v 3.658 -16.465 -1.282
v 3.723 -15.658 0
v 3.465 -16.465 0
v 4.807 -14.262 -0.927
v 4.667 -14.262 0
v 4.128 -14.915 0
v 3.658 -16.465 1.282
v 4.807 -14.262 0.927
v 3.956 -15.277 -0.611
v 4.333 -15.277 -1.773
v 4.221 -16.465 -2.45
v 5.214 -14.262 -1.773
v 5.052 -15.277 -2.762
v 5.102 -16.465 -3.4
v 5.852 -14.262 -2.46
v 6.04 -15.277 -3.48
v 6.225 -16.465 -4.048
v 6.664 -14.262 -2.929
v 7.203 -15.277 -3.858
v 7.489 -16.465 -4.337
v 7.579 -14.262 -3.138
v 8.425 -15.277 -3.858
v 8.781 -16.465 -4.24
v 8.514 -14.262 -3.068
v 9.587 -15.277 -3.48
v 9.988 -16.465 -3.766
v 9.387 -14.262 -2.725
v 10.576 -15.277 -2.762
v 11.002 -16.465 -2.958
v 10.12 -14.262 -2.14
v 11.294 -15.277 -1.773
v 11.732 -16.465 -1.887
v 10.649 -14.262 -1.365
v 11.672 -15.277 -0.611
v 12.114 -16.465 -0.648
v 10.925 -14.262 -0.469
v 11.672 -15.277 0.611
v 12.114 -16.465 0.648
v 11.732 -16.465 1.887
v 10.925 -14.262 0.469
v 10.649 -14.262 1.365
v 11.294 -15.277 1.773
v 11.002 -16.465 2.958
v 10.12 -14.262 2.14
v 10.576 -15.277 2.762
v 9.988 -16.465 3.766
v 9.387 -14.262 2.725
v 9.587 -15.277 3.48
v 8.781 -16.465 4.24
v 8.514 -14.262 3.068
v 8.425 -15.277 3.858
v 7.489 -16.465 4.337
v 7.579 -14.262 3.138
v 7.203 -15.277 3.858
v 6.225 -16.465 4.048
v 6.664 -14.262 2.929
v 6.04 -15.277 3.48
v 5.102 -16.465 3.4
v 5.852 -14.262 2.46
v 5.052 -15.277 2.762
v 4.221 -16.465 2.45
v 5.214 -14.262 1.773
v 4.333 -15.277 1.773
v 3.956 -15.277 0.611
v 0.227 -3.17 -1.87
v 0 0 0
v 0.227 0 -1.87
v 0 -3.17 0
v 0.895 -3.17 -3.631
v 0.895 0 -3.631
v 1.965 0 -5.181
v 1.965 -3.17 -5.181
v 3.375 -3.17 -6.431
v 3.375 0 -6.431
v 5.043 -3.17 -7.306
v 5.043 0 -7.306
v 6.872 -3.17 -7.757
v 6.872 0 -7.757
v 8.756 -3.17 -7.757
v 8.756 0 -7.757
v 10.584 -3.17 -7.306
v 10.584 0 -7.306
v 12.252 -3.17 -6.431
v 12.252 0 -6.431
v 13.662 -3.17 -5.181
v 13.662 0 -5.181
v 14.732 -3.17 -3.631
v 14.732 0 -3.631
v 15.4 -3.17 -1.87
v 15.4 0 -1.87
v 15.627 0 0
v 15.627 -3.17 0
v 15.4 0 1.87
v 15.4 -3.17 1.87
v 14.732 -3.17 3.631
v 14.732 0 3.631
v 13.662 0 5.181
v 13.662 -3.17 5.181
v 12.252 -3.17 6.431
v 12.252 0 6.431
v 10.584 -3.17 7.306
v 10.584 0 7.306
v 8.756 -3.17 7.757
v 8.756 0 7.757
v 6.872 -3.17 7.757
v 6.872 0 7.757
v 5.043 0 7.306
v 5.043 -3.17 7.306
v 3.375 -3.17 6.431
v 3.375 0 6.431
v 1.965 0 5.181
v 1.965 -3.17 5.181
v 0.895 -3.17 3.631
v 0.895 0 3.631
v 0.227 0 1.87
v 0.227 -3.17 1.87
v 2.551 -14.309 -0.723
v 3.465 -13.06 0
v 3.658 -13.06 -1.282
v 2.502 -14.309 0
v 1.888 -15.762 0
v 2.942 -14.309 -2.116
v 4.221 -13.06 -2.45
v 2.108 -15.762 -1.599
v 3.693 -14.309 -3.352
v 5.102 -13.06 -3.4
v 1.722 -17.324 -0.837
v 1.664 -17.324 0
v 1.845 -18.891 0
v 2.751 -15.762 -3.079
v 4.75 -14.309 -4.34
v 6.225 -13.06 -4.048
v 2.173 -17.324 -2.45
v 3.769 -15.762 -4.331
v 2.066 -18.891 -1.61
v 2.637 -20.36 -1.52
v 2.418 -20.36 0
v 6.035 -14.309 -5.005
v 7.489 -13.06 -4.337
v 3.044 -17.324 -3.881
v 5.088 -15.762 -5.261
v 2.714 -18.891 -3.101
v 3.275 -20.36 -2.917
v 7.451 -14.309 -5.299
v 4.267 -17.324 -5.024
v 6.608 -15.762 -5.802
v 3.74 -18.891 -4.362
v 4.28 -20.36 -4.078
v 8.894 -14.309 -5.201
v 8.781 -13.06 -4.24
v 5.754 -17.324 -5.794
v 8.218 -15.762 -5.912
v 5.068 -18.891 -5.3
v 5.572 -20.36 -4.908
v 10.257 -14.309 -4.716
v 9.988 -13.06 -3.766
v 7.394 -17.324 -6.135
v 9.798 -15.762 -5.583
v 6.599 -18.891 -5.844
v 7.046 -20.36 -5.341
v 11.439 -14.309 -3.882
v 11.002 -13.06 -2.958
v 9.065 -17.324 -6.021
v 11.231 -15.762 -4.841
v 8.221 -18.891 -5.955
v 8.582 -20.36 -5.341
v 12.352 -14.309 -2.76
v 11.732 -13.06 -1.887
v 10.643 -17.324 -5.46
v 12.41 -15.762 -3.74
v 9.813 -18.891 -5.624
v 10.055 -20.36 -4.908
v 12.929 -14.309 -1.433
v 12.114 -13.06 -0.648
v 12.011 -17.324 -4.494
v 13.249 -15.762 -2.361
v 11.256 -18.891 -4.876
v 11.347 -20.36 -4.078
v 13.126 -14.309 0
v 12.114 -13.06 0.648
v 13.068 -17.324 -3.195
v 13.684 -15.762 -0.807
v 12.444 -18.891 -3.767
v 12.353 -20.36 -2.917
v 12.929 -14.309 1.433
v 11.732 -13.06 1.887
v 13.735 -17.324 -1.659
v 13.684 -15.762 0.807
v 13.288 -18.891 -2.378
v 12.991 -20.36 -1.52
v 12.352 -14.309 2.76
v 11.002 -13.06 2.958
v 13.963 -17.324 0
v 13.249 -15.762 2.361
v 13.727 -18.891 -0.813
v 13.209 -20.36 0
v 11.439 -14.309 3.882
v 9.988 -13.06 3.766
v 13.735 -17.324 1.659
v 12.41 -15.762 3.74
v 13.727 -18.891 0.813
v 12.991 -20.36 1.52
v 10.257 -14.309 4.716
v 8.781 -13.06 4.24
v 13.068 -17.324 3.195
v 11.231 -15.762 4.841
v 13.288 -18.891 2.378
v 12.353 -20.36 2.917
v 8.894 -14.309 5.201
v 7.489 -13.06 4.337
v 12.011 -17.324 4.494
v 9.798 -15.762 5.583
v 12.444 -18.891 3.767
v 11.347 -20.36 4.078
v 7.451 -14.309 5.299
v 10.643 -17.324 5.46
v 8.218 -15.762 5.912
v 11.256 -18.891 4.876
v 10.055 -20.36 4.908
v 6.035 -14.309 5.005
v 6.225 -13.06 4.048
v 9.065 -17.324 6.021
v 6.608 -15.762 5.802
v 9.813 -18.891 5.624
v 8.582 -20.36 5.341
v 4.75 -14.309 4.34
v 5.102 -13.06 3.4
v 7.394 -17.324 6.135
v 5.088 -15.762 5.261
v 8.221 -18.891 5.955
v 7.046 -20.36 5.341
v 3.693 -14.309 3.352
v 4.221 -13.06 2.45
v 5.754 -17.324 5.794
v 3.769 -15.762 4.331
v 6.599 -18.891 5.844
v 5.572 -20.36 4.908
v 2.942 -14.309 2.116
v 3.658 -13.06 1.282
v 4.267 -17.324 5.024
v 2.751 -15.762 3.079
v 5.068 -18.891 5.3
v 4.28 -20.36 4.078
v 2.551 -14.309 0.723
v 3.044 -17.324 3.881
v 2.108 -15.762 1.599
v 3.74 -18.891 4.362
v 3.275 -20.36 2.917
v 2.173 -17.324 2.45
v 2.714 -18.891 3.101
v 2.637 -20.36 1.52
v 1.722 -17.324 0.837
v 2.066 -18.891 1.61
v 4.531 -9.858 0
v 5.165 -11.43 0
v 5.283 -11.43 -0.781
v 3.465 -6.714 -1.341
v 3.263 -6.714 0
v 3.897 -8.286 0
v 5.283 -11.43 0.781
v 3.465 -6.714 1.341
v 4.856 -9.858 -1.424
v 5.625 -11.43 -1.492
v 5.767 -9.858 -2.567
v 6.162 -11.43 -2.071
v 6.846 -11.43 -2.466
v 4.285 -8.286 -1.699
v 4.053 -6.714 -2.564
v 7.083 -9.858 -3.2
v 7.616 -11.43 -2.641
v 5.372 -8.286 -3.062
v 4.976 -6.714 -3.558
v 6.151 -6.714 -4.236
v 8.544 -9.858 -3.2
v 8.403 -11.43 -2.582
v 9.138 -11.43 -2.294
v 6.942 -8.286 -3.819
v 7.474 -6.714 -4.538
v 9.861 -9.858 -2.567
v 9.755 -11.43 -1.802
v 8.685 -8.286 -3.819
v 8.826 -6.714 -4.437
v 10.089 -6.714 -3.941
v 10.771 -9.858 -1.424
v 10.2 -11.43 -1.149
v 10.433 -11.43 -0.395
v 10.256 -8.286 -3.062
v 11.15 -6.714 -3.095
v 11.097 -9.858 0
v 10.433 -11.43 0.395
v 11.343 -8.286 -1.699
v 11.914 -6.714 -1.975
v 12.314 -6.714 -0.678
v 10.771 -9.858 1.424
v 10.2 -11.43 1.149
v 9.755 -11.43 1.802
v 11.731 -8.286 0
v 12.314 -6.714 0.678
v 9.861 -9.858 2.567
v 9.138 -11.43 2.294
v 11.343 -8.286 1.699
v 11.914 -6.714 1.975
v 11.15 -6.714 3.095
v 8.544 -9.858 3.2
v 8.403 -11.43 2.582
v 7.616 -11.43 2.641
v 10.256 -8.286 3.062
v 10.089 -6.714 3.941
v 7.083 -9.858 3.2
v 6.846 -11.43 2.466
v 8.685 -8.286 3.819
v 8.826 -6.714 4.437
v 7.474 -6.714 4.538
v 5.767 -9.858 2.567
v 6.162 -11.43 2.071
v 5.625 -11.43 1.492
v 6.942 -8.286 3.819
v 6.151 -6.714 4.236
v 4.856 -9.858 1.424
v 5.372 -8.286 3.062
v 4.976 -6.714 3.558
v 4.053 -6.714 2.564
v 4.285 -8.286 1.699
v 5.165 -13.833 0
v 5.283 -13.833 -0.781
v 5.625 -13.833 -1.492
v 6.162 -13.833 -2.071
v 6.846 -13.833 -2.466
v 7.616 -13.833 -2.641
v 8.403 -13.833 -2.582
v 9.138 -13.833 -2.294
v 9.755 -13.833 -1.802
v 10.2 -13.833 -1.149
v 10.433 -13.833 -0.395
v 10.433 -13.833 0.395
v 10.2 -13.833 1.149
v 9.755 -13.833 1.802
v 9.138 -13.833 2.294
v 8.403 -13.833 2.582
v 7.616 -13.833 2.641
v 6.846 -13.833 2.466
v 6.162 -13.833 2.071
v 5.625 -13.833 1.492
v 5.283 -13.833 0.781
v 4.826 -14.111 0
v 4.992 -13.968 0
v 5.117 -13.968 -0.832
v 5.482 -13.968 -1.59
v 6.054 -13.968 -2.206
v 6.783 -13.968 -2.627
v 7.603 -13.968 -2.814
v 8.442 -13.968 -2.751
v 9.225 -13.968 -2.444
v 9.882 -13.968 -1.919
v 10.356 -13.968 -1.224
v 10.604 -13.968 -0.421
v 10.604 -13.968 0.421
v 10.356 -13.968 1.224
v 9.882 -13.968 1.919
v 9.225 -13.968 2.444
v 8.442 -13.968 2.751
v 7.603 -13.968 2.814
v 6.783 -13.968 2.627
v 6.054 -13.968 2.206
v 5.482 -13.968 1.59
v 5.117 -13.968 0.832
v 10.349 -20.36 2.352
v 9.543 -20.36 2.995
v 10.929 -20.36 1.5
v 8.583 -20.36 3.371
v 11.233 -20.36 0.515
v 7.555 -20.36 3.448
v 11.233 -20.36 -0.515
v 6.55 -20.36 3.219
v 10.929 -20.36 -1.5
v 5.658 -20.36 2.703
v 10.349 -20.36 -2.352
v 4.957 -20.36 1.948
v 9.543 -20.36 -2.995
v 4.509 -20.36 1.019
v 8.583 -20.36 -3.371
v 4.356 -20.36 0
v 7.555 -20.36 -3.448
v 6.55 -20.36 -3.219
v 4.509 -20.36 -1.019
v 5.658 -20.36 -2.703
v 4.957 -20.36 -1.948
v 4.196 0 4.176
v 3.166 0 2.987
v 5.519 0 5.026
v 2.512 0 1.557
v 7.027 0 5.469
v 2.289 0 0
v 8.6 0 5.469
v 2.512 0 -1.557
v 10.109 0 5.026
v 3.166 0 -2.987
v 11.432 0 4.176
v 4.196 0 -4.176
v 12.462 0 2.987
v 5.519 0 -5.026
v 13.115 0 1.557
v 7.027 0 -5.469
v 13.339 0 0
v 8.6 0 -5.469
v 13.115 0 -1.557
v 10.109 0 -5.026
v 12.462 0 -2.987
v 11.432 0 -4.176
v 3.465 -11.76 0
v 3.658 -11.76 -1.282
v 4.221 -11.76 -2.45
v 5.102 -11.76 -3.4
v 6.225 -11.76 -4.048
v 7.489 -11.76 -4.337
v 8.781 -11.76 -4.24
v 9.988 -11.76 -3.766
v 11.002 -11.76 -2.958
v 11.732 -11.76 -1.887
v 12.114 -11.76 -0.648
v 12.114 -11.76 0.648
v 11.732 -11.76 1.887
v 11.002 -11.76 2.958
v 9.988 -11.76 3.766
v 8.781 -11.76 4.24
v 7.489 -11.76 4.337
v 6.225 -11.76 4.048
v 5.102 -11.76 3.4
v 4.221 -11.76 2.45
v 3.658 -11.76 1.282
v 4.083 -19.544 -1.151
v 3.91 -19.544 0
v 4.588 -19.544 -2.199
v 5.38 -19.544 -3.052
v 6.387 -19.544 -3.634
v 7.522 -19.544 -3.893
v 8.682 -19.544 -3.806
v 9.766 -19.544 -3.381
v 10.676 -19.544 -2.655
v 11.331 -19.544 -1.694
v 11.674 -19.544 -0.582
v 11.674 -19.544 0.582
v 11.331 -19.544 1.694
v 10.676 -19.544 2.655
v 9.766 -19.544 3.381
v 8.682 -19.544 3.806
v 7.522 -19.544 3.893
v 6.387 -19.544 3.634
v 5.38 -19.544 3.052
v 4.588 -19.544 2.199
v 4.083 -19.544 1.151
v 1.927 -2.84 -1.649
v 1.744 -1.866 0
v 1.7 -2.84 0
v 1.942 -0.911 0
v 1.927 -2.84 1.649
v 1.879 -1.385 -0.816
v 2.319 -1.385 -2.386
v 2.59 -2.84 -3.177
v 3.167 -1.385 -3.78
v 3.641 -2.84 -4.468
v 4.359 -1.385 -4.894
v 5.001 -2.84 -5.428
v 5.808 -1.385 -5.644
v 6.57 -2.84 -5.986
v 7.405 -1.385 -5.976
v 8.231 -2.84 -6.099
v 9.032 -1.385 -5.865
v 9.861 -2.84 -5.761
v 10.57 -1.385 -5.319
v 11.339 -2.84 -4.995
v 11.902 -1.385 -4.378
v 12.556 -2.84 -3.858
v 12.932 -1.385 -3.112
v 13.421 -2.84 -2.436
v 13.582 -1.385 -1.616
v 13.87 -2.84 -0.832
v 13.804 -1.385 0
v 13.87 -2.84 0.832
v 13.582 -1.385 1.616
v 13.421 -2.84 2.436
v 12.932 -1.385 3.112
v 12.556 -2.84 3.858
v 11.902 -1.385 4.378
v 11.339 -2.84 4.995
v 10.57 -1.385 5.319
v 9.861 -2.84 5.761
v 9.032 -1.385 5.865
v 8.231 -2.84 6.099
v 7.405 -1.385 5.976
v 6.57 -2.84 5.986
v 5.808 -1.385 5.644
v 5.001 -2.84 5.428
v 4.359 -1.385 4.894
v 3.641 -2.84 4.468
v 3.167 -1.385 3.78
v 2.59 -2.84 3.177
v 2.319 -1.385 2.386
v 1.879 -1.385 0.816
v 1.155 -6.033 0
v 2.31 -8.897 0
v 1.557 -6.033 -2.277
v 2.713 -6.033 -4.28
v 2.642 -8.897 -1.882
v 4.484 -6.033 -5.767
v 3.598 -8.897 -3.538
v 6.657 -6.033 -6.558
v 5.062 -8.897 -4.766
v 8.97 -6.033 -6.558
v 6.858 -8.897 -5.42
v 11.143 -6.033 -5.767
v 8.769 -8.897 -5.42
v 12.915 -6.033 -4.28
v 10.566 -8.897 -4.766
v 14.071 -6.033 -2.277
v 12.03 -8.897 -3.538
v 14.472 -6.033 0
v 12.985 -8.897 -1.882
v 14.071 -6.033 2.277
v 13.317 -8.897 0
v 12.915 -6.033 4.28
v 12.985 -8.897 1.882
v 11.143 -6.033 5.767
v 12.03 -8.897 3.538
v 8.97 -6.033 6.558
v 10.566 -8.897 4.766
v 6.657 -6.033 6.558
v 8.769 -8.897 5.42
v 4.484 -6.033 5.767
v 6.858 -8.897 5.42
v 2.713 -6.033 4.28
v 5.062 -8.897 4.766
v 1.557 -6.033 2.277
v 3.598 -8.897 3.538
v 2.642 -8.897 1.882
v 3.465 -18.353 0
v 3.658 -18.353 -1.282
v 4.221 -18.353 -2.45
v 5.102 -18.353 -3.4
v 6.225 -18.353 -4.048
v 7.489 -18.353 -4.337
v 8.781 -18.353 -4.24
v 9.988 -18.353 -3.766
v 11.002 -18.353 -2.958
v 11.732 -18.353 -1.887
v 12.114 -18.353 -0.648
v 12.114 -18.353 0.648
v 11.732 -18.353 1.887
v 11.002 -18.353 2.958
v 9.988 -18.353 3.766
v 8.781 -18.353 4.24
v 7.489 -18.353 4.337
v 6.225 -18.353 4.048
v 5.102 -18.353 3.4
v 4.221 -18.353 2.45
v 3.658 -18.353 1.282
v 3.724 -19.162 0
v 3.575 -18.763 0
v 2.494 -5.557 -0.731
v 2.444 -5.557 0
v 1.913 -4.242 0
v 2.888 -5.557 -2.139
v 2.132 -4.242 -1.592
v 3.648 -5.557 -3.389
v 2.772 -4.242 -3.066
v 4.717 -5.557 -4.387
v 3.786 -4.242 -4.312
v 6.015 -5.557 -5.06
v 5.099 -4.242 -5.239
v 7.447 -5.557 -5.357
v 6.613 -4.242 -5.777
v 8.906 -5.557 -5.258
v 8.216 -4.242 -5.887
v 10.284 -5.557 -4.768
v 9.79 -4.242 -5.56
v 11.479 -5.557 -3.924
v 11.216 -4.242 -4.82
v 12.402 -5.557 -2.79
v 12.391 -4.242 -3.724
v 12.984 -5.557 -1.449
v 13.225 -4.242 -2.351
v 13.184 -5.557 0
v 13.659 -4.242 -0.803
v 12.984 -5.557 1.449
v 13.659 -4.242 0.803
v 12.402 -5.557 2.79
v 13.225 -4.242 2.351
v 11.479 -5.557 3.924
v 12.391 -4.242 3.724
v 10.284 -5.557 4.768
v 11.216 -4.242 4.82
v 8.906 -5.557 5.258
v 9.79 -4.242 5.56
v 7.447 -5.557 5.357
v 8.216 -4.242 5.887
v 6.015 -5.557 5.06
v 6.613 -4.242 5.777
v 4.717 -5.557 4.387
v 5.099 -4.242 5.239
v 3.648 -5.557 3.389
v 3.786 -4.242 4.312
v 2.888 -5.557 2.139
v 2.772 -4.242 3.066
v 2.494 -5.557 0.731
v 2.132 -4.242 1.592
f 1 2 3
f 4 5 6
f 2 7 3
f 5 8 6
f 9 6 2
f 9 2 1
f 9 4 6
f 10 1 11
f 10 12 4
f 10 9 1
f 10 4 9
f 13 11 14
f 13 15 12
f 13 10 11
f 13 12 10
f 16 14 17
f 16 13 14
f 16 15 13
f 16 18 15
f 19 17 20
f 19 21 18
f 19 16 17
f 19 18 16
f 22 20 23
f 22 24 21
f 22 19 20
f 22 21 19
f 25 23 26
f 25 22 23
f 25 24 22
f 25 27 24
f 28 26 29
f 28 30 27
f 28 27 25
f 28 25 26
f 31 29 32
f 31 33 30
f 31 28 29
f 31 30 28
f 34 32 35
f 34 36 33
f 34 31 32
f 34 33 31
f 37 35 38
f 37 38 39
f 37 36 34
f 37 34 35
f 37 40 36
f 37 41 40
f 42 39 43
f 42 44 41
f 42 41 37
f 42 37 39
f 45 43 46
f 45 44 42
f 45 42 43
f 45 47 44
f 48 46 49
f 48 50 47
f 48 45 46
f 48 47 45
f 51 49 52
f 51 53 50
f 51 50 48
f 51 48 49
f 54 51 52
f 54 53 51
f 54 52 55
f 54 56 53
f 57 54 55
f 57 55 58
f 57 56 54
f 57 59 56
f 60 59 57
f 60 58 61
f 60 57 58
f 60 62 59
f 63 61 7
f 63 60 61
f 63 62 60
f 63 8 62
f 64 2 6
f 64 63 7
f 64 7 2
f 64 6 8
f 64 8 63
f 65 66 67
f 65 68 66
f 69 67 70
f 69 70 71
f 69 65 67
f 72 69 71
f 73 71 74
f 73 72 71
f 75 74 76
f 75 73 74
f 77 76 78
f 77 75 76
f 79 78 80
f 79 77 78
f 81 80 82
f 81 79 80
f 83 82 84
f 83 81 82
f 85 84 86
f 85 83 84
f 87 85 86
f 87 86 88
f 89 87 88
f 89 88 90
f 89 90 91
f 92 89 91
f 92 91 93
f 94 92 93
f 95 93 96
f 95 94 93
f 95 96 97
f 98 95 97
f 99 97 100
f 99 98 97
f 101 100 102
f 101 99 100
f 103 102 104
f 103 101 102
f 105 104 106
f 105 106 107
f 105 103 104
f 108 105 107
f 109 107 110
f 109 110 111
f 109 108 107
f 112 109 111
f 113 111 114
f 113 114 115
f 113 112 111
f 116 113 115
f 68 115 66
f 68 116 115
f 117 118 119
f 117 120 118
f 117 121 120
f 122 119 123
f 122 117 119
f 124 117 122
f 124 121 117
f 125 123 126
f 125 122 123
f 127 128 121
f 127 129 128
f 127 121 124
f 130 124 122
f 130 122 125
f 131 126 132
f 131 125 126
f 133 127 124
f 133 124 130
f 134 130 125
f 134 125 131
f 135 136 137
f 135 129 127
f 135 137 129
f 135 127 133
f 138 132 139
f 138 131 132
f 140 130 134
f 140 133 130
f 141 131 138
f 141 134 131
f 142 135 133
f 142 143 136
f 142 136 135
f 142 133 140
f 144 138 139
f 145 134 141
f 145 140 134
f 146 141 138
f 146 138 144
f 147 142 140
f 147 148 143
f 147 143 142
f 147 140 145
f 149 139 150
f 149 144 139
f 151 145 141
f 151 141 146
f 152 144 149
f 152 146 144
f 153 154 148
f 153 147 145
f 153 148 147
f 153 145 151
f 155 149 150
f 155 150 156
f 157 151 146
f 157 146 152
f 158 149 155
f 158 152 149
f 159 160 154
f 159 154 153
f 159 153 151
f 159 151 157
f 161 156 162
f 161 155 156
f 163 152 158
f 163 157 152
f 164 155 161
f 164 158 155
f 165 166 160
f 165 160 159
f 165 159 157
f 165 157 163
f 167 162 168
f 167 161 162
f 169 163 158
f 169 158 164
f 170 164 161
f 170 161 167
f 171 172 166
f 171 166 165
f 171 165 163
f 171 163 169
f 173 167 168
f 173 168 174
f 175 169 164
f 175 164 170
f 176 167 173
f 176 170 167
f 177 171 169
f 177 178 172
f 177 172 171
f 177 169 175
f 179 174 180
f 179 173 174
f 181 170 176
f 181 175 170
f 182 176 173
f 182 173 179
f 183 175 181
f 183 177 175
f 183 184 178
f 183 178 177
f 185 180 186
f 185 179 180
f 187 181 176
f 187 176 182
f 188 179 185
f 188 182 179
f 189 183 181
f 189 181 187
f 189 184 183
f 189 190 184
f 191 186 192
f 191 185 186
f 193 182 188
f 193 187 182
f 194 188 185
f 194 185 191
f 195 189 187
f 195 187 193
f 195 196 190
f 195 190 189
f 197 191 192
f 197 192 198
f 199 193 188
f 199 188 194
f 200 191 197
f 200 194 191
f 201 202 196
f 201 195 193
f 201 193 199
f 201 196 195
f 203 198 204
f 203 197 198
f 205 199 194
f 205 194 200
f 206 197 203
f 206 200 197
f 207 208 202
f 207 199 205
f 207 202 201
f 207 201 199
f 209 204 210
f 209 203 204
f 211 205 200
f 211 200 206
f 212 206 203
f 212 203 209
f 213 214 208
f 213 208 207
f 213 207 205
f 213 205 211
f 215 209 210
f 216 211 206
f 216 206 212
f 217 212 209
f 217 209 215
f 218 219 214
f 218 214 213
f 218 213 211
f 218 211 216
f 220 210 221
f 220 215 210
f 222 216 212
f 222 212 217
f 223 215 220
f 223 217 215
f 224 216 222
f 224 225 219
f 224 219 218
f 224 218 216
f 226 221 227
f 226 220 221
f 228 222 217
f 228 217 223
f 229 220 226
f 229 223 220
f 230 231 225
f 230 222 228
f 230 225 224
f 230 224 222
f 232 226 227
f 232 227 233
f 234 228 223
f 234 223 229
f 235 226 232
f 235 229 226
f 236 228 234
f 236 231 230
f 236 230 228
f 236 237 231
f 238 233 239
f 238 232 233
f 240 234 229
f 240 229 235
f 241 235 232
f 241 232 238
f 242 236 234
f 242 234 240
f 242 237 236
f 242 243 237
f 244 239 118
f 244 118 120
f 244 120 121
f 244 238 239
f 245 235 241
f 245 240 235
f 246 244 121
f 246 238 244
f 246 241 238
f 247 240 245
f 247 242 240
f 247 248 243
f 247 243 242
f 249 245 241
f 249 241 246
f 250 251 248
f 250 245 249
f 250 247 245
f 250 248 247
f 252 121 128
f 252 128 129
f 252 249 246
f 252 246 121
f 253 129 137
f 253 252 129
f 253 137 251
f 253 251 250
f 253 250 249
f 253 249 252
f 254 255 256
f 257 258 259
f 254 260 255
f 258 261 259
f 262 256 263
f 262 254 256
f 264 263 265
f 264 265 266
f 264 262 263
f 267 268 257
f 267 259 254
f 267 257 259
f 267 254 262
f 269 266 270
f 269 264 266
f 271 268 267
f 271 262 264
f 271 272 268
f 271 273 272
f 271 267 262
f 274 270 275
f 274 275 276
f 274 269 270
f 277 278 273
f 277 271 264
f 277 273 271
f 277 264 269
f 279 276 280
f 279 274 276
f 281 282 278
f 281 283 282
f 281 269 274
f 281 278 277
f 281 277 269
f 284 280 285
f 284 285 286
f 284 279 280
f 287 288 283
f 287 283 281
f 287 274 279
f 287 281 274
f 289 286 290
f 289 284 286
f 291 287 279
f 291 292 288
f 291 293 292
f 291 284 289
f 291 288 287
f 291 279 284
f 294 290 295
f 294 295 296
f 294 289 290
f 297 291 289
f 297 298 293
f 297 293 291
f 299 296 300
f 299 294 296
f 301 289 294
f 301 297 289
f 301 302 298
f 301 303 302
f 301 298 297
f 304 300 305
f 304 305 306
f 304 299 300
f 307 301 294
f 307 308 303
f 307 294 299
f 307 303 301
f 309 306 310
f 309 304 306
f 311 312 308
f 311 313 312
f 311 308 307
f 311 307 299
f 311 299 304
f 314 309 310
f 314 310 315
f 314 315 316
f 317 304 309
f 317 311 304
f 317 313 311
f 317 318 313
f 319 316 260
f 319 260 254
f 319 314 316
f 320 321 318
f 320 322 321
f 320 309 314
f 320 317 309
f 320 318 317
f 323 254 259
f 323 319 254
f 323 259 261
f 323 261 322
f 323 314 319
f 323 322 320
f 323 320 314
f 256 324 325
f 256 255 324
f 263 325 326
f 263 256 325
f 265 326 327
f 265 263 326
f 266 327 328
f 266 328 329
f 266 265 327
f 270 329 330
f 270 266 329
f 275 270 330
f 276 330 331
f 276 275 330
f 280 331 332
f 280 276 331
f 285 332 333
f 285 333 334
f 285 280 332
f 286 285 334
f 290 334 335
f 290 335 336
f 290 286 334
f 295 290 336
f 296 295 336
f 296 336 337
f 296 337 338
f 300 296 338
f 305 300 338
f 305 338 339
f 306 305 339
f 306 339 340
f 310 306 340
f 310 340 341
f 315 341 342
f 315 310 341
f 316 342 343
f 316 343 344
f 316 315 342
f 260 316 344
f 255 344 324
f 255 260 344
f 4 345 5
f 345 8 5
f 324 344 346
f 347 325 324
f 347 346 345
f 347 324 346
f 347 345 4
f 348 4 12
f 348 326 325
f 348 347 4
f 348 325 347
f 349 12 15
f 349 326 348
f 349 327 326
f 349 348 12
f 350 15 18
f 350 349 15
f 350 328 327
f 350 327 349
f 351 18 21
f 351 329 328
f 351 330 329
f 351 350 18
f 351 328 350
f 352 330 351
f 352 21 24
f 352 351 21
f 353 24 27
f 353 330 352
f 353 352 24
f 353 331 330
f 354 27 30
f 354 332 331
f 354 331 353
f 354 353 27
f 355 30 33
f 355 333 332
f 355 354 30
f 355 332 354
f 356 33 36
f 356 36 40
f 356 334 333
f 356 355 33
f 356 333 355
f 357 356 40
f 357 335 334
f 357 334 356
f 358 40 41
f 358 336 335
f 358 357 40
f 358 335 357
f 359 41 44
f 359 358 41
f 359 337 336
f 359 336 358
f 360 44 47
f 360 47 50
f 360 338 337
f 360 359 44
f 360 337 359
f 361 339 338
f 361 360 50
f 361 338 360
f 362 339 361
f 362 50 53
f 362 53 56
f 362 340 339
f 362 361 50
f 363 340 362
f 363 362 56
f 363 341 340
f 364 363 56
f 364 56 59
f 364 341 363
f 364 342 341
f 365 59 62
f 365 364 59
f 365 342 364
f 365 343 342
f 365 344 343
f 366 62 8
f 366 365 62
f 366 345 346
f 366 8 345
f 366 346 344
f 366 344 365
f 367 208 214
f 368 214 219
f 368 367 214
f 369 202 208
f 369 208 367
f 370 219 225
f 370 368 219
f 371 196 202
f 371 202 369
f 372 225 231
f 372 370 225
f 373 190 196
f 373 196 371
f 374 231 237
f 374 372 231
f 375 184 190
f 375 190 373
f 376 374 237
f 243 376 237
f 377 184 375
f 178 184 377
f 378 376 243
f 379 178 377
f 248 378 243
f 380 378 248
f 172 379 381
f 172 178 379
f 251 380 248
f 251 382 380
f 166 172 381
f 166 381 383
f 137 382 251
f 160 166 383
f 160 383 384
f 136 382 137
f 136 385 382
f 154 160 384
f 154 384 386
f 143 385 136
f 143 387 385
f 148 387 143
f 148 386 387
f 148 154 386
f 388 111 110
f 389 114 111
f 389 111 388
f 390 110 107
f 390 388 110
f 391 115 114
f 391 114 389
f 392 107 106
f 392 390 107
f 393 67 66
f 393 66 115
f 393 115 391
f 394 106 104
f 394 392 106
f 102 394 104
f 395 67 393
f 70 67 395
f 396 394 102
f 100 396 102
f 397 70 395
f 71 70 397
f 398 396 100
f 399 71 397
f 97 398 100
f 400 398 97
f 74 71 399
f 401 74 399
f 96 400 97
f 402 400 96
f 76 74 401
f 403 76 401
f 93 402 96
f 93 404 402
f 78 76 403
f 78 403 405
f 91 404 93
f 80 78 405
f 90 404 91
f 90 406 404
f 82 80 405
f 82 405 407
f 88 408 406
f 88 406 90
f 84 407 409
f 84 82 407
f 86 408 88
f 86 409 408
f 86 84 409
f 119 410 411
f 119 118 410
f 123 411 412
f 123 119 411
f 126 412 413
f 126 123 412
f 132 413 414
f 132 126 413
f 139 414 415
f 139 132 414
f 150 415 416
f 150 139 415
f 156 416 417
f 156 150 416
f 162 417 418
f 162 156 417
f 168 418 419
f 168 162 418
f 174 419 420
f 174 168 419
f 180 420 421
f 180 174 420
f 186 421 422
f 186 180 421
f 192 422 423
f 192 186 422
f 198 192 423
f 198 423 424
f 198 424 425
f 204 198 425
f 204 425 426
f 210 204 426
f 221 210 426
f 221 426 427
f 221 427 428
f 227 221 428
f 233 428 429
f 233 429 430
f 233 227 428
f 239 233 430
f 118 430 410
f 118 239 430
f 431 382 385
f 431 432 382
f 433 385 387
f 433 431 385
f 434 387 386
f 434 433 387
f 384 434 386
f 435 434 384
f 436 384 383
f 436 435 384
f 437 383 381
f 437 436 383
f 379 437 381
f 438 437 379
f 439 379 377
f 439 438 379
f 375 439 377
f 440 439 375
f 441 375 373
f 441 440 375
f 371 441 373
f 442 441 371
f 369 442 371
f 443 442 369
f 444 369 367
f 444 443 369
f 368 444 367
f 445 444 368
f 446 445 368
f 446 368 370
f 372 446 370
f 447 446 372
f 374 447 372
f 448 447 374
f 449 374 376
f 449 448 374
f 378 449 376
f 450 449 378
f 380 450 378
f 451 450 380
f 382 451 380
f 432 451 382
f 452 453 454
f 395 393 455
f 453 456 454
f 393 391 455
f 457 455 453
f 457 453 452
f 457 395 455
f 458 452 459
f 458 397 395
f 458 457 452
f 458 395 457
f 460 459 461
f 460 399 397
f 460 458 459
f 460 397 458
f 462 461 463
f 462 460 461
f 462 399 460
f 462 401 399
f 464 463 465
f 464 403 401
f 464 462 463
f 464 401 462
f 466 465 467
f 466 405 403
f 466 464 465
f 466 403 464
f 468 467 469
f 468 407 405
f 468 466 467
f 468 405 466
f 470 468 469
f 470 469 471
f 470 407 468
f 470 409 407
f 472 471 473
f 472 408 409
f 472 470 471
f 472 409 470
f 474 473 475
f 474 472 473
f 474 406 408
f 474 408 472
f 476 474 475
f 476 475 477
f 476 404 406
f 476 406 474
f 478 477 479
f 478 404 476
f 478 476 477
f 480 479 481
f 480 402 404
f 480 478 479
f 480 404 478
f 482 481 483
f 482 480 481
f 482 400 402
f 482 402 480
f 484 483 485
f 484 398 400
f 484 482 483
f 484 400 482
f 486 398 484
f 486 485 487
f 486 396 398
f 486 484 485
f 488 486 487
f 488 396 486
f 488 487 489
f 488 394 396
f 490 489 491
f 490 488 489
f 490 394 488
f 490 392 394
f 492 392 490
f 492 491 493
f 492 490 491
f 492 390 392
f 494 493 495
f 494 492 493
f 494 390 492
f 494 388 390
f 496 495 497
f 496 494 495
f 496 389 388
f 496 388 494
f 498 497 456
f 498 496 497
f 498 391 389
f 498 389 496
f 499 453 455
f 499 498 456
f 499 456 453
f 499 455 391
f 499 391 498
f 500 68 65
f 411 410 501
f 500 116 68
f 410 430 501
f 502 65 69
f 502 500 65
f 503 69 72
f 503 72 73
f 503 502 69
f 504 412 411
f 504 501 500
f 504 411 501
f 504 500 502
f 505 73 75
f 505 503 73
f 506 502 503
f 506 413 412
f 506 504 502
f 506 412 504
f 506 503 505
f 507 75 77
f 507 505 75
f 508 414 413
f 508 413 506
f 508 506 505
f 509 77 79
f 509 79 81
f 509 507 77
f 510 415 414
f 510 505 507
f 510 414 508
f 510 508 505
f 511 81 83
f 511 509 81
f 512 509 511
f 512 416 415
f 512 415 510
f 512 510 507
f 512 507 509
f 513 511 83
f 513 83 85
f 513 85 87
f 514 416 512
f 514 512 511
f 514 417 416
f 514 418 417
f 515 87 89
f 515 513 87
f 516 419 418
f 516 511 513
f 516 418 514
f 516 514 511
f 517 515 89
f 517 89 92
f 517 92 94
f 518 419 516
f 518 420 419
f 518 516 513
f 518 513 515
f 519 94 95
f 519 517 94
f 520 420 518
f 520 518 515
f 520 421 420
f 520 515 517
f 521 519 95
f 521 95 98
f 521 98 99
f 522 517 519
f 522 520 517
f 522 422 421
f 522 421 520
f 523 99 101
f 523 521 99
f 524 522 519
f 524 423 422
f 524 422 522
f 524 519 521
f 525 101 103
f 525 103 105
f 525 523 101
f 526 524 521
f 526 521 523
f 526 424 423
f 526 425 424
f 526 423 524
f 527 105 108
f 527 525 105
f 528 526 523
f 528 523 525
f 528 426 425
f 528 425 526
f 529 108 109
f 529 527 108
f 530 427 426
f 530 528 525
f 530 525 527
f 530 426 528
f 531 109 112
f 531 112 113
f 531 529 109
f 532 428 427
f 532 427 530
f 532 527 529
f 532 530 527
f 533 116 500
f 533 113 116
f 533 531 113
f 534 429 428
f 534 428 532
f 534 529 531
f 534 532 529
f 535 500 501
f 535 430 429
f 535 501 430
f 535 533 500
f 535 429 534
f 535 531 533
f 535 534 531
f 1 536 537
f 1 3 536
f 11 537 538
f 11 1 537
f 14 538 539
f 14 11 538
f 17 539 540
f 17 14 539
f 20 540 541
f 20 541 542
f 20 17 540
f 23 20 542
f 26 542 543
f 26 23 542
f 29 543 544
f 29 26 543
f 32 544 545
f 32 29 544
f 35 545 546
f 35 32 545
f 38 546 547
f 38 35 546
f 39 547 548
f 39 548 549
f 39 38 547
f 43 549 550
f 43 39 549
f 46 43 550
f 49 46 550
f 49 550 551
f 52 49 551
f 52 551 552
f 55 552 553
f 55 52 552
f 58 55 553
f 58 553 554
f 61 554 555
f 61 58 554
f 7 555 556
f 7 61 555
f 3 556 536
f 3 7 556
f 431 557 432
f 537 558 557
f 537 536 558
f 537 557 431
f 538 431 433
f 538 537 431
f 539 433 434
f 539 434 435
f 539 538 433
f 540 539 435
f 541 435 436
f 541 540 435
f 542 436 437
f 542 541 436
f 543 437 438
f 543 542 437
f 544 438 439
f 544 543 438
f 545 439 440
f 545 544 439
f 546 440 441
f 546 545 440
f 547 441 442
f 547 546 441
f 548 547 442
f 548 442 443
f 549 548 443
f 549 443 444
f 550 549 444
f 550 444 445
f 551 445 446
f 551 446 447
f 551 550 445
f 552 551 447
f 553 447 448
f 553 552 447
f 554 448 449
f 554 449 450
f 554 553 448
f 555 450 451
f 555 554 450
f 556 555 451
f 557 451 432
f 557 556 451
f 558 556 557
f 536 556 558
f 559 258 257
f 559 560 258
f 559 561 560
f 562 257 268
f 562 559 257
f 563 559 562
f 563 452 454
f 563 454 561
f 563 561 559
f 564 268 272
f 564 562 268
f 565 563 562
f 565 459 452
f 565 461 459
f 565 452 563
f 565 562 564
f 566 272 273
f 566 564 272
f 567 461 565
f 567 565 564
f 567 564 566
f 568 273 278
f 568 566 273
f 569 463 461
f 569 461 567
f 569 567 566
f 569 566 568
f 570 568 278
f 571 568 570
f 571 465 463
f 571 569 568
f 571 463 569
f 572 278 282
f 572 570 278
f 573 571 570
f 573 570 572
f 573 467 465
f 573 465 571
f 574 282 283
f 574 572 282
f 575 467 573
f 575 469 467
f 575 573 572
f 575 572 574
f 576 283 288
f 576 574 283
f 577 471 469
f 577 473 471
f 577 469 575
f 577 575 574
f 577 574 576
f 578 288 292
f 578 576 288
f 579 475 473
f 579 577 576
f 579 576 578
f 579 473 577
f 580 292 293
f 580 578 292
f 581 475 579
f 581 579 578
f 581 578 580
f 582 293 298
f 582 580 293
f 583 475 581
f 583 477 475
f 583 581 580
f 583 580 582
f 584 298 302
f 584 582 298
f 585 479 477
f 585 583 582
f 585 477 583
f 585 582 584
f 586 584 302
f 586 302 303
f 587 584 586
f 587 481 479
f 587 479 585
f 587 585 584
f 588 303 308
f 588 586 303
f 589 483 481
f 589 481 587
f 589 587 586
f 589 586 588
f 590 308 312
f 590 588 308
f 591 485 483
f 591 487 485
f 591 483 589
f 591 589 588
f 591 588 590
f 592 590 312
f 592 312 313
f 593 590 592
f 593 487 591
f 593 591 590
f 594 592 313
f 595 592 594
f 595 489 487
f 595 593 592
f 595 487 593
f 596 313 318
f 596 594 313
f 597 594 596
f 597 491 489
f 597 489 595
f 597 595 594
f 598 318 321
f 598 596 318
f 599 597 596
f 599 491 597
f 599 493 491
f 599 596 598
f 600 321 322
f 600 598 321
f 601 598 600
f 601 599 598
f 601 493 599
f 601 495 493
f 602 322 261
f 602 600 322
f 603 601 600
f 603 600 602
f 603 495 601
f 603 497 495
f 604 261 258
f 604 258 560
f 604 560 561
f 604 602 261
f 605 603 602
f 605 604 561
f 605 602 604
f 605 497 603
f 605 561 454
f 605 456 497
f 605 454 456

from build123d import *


with BuildPart() as part:
    # Croquis1 → Revolución1 (revolve)
    with BuildSketch(Plane.XY):
        with BuildLine():
            Line((2.288621504, 0), (0, 0))
            Line((0, 0), (0, -3.17))
            Line((0, -3.17), (3.465, -11.76))
            Line((3.465, -11.76), (5.165, -11.76))
            Line((5.165, -11.76), (5.165, -11.43004663))
            Line((5.165, -11.43004663), (3.2627067, -6.714116055))
            ThreePointArc((3.2627067, -6.714116055), (2.140427602, -4.914602613), (1.7, -2.84004663))
            ThreePointArc((1.7, -2.84004663), (1.823561842, -1.38463429), (2.288621504, 0))
        make_face()
        with BuildLine():
            Line((5.165, -11.76), (3.465, -11.76))
            Line((3.465, -11.76), (3.465, -13.06))
            Line((3.465, -13.06), (4.667081528, -14.262081528))
            ThreePointArc((4.667081528, -14.262081528), (4.908103346, -14.038251376), (5.165, -13.83283579))
            Line((5.165, -13.83283579), (5.165, -11.76))
        make_face()
        with BuildLine():
            Line((4.667081528, -14.262081528), (3.465, -13.06))
            Line((3.465, -13.06), (3.465, -16.464646325))
            ThreePointArc((3.465, -16.464646325), (3.907580372, -15.276881881), (4.667081528, -14.262081528))
        make_face()
        with BuildLine():
            Line((3.465, -16.464646325), (3.465, -13.06))
            ThreePointArc((3.465, -13.06), (1.725988008, -16.53567688), (2.418118888, -20.36))
            Line((2.418118888, -20.36), (3.465, -20.36))
            Line((3.465, -20.36), (3.465, -18.352767084))
            ThreePointArc((3.465, -18.352767084), (3.363706704, -17.408706704), (3.465, -16.464646325))
        make_face()
        with BuildLine():
            Line((3.465, -18.352767084), (3.465, -16.464646325))
            ThreePointArc((3.465, -16.464646325), (3.363706704, -17.408706704), (3.465, -18.352767084))
        make_face()
        with BuildLine():
            ThreePointArc((3.909582187, -19.544195349), (3.644512403, -18.964444111), (3.465, -18.352767084))
            Line((3.465, -18.352767084), (3.465, -20.36))
            Line((3.465, -20.36), (4.355813233, -20.36))
            Line((4.355813233, -20.36), (3.909582187, -19.544195349))
        make_face()
    revolve(axis=Axis((7.813706704, 0, 0), (0, -1, 0)))


solid = part.part
